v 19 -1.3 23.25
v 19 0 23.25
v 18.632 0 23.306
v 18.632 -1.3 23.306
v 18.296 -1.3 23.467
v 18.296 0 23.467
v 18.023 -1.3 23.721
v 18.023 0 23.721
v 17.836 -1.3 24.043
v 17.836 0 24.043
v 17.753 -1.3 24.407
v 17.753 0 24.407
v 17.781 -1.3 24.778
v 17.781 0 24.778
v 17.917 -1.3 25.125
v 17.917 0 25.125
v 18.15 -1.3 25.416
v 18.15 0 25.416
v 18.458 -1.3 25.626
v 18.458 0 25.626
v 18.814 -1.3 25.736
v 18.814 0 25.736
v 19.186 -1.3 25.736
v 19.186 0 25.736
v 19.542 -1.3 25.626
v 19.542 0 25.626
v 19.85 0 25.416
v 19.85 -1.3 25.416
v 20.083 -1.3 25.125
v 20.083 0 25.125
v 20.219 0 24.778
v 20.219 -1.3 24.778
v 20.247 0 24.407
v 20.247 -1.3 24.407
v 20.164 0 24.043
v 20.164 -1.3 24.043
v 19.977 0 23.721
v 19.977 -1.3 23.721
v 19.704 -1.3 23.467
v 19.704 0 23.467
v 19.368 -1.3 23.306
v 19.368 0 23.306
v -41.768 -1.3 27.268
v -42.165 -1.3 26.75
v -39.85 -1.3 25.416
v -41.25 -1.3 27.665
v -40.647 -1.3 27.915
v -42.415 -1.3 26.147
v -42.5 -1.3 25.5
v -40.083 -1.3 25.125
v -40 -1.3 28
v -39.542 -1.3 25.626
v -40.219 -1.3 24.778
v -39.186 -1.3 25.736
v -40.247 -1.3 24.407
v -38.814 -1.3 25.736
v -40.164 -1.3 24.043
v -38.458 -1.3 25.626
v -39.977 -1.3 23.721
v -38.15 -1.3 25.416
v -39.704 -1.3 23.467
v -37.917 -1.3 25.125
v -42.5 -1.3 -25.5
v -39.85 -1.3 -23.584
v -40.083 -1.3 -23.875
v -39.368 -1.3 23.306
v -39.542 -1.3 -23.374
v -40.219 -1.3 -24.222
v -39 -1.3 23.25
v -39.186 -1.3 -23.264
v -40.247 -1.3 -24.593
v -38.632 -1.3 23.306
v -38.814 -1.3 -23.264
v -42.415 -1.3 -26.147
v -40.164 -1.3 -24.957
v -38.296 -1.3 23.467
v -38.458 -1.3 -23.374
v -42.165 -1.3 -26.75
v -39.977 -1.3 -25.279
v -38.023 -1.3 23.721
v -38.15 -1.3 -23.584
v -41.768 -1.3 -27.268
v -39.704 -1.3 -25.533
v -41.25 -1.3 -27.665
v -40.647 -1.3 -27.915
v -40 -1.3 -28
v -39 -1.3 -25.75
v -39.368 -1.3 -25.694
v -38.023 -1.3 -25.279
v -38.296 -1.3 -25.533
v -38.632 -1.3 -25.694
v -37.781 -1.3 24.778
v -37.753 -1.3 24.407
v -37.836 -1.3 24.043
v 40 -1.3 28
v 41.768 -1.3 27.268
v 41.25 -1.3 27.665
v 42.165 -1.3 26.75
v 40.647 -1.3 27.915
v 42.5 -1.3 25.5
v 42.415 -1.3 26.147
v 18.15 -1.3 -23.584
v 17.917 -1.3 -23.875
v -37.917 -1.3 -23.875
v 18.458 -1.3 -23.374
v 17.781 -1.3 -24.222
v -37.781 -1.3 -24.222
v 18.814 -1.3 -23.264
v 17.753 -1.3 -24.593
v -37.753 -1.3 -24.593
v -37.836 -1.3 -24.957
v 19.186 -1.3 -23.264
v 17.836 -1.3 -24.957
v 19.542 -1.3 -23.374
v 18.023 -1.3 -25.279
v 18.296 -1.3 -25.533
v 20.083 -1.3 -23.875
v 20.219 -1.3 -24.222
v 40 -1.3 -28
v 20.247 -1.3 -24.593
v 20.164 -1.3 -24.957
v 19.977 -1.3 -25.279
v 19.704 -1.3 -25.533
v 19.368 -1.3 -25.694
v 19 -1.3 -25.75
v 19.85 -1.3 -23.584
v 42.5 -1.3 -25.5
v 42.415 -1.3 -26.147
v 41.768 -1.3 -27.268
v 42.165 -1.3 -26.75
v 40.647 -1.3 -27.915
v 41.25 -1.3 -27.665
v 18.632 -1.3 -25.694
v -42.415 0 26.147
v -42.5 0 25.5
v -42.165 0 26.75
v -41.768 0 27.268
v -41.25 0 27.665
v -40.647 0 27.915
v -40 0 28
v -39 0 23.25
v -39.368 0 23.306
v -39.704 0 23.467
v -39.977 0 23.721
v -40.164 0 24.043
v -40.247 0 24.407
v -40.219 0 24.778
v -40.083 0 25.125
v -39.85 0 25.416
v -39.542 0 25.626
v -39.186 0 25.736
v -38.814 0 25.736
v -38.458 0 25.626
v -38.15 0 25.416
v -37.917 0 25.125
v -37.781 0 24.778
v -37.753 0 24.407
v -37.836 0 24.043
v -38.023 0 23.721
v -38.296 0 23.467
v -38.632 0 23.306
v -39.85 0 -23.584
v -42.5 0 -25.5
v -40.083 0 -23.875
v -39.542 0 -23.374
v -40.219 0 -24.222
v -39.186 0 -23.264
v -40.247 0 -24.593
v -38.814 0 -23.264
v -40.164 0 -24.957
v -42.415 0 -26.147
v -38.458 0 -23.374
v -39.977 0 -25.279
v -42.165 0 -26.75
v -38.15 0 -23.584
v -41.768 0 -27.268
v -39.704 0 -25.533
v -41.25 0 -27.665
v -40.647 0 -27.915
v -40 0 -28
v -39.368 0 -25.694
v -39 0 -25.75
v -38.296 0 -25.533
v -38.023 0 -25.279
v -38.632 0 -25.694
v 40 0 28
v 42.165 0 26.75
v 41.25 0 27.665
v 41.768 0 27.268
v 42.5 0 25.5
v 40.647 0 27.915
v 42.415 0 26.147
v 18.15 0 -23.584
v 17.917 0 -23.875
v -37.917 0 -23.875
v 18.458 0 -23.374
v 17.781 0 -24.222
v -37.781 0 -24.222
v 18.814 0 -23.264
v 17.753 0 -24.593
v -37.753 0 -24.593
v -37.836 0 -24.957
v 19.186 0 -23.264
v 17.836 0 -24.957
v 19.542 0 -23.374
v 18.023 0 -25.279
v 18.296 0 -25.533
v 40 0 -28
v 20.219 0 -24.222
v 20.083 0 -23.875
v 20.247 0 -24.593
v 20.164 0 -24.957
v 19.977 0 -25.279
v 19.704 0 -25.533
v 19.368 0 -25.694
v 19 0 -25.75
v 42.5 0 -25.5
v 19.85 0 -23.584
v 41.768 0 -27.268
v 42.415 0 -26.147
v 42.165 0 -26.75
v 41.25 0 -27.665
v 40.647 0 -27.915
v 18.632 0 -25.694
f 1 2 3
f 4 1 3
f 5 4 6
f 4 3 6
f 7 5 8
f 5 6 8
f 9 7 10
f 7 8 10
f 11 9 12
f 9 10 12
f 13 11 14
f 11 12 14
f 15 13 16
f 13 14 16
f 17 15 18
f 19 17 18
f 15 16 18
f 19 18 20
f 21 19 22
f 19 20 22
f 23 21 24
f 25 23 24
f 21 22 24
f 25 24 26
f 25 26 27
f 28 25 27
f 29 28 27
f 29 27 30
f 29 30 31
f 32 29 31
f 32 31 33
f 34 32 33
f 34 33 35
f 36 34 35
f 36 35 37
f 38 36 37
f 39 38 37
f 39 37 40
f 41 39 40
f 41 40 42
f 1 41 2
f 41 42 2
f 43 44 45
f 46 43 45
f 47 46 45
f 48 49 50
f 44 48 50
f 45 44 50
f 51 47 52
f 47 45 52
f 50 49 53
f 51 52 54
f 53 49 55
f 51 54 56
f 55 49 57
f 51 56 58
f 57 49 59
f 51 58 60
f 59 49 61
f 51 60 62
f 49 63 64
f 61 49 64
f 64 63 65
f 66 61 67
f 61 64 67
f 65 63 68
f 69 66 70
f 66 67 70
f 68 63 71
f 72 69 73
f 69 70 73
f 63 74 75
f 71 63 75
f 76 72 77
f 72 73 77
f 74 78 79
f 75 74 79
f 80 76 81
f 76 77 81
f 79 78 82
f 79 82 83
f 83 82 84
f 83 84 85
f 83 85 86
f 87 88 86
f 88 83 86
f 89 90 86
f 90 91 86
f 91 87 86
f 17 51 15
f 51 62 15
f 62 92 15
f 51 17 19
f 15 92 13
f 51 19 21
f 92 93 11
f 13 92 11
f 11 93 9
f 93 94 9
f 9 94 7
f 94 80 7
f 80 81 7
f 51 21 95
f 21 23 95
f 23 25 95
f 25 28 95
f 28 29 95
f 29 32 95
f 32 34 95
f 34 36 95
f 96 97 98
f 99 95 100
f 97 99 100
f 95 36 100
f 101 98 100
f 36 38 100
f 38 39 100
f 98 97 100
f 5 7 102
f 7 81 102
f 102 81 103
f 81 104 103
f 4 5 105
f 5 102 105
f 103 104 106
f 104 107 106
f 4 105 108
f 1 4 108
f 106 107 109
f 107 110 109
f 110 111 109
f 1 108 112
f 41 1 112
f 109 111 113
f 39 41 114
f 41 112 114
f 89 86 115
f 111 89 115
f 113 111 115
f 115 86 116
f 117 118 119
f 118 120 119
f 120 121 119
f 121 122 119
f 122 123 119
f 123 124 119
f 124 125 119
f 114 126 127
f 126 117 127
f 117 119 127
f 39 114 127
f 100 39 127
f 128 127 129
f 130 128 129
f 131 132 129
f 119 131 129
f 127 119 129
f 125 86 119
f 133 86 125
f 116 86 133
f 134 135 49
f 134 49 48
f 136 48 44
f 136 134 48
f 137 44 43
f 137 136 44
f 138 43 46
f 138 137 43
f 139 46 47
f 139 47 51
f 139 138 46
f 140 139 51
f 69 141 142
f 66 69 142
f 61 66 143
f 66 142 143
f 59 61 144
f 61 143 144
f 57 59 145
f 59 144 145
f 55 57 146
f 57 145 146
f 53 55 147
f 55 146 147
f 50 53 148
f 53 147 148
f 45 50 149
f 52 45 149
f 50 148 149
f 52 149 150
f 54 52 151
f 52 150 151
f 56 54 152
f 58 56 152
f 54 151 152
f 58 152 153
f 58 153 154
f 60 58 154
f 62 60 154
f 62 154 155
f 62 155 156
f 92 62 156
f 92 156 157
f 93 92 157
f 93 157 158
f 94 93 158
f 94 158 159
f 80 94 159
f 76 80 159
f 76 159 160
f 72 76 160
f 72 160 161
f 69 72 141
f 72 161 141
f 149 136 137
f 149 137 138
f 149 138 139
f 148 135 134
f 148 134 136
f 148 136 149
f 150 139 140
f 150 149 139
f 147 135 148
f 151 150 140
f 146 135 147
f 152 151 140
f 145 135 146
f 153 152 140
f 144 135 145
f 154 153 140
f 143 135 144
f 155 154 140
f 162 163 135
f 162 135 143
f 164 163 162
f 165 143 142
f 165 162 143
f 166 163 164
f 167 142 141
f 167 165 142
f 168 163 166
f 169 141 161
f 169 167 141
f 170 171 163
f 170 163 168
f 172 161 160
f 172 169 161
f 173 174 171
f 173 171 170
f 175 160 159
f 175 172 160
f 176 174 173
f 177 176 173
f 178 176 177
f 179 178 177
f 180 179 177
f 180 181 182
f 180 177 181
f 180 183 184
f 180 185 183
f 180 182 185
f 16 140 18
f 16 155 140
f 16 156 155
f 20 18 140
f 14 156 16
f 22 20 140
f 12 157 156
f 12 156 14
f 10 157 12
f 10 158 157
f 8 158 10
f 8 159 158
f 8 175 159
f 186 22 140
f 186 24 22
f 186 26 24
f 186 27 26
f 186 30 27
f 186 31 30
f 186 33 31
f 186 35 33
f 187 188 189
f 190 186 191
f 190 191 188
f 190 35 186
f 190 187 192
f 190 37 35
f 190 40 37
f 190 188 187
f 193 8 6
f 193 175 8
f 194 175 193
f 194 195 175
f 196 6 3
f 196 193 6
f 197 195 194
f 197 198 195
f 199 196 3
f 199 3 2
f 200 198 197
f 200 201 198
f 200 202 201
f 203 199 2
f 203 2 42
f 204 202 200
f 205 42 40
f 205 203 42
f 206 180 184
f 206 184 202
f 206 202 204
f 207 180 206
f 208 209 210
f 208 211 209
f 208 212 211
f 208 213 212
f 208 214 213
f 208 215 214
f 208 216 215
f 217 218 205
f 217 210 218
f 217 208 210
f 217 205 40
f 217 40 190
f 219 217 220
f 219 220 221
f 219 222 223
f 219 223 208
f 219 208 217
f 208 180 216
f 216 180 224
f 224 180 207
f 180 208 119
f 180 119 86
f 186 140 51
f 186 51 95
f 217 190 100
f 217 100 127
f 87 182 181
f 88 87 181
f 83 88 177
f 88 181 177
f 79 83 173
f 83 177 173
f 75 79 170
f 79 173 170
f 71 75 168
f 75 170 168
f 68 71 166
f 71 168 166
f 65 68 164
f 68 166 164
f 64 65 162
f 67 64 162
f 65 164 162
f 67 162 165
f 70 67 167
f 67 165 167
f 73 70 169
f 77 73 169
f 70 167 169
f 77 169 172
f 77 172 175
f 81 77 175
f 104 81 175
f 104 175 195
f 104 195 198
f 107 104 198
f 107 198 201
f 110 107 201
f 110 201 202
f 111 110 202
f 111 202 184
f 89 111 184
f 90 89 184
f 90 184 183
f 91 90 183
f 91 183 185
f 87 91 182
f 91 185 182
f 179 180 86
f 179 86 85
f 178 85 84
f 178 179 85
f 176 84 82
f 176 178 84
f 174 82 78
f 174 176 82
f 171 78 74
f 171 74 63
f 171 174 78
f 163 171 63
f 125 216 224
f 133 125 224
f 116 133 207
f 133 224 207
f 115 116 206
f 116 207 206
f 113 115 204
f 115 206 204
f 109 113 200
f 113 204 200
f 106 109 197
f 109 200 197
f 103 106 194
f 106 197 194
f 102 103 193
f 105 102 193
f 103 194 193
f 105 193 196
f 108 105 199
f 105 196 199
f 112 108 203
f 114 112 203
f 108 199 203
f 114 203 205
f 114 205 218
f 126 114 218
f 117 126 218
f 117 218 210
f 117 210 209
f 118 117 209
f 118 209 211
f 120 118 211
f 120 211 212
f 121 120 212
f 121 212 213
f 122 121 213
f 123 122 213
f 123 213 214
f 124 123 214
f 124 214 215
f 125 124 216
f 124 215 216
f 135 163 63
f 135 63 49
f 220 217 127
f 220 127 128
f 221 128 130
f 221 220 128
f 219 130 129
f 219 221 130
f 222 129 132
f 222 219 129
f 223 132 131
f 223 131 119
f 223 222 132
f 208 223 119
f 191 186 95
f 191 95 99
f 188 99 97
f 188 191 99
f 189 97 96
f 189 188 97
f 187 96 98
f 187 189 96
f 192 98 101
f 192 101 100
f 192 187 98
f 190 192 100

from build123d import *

# Parameters (mm, degrees)
SCHIZZO1_R                   = 1.25
ESTRUSIONE_ESTRUSIONE1_DEPTH = 1.3


with BuildPart() as part:
    # Schizzo1 → Estrusione-Estrusione1 (new body)
    with BuildSketch(Plane(origin=(0, 0, 0), x_dir=(1, 0, 0), z_dir=(0, 1, 0))):
        with BuildLine():
            Line((42.5, -25.5), (42.5, 25.5))
            ThreePointArc((42.5, 25.5), (41.767766953, 27.267766953), (40, 28))
            Line((40, 28), (-40, 28))
            ThreePointArc((-40, 28), (-41.767766953, 27.267766953), (-42.5, 25.5))
            Line((-42.5, 25.5), (-42.5, -25.5))
            ThreePointArc((-42.5, -25.5), (-41.767766953, -27.267766953), (-40, -28))
            Line((-40, -28), (40, -28))
            ThreePointArc((40, -28), (41.767766953, -27.267766953), (42.5, -25.5))
        make_face()
        with Locations(Location((19, 24.5, 0), (0, 0, 90))):  # turned: the seam where the file's is
            Circle(SCHIZZO1_R, mode=Mode.SUBTRACT)
        with Locations(Location((-39, 24.5, 0), (0, 0, 90))):  # turned: the seam where the file's is
            Circle(SCHIZZO1_R, mode=Mode.SUBTRACT)
        with Locations(Location((-39, -24.5, 0), (0, 0, 90))):  # turned: the seam where the file's is
            Circle(SCHIZZO1_R, mode=Mode.SUBTRACT)
        with Locations(Location((19, -24.5, 0), (0, 0, 90))):  # turned: the seam where the file's is
            Circle(SCHIZZO1_R, mode=Mode.SUBTRACT)
    extrude(amount=-ESTRUSIONE_ESTRUSIONE1_DEPTH)


solid = part.part
